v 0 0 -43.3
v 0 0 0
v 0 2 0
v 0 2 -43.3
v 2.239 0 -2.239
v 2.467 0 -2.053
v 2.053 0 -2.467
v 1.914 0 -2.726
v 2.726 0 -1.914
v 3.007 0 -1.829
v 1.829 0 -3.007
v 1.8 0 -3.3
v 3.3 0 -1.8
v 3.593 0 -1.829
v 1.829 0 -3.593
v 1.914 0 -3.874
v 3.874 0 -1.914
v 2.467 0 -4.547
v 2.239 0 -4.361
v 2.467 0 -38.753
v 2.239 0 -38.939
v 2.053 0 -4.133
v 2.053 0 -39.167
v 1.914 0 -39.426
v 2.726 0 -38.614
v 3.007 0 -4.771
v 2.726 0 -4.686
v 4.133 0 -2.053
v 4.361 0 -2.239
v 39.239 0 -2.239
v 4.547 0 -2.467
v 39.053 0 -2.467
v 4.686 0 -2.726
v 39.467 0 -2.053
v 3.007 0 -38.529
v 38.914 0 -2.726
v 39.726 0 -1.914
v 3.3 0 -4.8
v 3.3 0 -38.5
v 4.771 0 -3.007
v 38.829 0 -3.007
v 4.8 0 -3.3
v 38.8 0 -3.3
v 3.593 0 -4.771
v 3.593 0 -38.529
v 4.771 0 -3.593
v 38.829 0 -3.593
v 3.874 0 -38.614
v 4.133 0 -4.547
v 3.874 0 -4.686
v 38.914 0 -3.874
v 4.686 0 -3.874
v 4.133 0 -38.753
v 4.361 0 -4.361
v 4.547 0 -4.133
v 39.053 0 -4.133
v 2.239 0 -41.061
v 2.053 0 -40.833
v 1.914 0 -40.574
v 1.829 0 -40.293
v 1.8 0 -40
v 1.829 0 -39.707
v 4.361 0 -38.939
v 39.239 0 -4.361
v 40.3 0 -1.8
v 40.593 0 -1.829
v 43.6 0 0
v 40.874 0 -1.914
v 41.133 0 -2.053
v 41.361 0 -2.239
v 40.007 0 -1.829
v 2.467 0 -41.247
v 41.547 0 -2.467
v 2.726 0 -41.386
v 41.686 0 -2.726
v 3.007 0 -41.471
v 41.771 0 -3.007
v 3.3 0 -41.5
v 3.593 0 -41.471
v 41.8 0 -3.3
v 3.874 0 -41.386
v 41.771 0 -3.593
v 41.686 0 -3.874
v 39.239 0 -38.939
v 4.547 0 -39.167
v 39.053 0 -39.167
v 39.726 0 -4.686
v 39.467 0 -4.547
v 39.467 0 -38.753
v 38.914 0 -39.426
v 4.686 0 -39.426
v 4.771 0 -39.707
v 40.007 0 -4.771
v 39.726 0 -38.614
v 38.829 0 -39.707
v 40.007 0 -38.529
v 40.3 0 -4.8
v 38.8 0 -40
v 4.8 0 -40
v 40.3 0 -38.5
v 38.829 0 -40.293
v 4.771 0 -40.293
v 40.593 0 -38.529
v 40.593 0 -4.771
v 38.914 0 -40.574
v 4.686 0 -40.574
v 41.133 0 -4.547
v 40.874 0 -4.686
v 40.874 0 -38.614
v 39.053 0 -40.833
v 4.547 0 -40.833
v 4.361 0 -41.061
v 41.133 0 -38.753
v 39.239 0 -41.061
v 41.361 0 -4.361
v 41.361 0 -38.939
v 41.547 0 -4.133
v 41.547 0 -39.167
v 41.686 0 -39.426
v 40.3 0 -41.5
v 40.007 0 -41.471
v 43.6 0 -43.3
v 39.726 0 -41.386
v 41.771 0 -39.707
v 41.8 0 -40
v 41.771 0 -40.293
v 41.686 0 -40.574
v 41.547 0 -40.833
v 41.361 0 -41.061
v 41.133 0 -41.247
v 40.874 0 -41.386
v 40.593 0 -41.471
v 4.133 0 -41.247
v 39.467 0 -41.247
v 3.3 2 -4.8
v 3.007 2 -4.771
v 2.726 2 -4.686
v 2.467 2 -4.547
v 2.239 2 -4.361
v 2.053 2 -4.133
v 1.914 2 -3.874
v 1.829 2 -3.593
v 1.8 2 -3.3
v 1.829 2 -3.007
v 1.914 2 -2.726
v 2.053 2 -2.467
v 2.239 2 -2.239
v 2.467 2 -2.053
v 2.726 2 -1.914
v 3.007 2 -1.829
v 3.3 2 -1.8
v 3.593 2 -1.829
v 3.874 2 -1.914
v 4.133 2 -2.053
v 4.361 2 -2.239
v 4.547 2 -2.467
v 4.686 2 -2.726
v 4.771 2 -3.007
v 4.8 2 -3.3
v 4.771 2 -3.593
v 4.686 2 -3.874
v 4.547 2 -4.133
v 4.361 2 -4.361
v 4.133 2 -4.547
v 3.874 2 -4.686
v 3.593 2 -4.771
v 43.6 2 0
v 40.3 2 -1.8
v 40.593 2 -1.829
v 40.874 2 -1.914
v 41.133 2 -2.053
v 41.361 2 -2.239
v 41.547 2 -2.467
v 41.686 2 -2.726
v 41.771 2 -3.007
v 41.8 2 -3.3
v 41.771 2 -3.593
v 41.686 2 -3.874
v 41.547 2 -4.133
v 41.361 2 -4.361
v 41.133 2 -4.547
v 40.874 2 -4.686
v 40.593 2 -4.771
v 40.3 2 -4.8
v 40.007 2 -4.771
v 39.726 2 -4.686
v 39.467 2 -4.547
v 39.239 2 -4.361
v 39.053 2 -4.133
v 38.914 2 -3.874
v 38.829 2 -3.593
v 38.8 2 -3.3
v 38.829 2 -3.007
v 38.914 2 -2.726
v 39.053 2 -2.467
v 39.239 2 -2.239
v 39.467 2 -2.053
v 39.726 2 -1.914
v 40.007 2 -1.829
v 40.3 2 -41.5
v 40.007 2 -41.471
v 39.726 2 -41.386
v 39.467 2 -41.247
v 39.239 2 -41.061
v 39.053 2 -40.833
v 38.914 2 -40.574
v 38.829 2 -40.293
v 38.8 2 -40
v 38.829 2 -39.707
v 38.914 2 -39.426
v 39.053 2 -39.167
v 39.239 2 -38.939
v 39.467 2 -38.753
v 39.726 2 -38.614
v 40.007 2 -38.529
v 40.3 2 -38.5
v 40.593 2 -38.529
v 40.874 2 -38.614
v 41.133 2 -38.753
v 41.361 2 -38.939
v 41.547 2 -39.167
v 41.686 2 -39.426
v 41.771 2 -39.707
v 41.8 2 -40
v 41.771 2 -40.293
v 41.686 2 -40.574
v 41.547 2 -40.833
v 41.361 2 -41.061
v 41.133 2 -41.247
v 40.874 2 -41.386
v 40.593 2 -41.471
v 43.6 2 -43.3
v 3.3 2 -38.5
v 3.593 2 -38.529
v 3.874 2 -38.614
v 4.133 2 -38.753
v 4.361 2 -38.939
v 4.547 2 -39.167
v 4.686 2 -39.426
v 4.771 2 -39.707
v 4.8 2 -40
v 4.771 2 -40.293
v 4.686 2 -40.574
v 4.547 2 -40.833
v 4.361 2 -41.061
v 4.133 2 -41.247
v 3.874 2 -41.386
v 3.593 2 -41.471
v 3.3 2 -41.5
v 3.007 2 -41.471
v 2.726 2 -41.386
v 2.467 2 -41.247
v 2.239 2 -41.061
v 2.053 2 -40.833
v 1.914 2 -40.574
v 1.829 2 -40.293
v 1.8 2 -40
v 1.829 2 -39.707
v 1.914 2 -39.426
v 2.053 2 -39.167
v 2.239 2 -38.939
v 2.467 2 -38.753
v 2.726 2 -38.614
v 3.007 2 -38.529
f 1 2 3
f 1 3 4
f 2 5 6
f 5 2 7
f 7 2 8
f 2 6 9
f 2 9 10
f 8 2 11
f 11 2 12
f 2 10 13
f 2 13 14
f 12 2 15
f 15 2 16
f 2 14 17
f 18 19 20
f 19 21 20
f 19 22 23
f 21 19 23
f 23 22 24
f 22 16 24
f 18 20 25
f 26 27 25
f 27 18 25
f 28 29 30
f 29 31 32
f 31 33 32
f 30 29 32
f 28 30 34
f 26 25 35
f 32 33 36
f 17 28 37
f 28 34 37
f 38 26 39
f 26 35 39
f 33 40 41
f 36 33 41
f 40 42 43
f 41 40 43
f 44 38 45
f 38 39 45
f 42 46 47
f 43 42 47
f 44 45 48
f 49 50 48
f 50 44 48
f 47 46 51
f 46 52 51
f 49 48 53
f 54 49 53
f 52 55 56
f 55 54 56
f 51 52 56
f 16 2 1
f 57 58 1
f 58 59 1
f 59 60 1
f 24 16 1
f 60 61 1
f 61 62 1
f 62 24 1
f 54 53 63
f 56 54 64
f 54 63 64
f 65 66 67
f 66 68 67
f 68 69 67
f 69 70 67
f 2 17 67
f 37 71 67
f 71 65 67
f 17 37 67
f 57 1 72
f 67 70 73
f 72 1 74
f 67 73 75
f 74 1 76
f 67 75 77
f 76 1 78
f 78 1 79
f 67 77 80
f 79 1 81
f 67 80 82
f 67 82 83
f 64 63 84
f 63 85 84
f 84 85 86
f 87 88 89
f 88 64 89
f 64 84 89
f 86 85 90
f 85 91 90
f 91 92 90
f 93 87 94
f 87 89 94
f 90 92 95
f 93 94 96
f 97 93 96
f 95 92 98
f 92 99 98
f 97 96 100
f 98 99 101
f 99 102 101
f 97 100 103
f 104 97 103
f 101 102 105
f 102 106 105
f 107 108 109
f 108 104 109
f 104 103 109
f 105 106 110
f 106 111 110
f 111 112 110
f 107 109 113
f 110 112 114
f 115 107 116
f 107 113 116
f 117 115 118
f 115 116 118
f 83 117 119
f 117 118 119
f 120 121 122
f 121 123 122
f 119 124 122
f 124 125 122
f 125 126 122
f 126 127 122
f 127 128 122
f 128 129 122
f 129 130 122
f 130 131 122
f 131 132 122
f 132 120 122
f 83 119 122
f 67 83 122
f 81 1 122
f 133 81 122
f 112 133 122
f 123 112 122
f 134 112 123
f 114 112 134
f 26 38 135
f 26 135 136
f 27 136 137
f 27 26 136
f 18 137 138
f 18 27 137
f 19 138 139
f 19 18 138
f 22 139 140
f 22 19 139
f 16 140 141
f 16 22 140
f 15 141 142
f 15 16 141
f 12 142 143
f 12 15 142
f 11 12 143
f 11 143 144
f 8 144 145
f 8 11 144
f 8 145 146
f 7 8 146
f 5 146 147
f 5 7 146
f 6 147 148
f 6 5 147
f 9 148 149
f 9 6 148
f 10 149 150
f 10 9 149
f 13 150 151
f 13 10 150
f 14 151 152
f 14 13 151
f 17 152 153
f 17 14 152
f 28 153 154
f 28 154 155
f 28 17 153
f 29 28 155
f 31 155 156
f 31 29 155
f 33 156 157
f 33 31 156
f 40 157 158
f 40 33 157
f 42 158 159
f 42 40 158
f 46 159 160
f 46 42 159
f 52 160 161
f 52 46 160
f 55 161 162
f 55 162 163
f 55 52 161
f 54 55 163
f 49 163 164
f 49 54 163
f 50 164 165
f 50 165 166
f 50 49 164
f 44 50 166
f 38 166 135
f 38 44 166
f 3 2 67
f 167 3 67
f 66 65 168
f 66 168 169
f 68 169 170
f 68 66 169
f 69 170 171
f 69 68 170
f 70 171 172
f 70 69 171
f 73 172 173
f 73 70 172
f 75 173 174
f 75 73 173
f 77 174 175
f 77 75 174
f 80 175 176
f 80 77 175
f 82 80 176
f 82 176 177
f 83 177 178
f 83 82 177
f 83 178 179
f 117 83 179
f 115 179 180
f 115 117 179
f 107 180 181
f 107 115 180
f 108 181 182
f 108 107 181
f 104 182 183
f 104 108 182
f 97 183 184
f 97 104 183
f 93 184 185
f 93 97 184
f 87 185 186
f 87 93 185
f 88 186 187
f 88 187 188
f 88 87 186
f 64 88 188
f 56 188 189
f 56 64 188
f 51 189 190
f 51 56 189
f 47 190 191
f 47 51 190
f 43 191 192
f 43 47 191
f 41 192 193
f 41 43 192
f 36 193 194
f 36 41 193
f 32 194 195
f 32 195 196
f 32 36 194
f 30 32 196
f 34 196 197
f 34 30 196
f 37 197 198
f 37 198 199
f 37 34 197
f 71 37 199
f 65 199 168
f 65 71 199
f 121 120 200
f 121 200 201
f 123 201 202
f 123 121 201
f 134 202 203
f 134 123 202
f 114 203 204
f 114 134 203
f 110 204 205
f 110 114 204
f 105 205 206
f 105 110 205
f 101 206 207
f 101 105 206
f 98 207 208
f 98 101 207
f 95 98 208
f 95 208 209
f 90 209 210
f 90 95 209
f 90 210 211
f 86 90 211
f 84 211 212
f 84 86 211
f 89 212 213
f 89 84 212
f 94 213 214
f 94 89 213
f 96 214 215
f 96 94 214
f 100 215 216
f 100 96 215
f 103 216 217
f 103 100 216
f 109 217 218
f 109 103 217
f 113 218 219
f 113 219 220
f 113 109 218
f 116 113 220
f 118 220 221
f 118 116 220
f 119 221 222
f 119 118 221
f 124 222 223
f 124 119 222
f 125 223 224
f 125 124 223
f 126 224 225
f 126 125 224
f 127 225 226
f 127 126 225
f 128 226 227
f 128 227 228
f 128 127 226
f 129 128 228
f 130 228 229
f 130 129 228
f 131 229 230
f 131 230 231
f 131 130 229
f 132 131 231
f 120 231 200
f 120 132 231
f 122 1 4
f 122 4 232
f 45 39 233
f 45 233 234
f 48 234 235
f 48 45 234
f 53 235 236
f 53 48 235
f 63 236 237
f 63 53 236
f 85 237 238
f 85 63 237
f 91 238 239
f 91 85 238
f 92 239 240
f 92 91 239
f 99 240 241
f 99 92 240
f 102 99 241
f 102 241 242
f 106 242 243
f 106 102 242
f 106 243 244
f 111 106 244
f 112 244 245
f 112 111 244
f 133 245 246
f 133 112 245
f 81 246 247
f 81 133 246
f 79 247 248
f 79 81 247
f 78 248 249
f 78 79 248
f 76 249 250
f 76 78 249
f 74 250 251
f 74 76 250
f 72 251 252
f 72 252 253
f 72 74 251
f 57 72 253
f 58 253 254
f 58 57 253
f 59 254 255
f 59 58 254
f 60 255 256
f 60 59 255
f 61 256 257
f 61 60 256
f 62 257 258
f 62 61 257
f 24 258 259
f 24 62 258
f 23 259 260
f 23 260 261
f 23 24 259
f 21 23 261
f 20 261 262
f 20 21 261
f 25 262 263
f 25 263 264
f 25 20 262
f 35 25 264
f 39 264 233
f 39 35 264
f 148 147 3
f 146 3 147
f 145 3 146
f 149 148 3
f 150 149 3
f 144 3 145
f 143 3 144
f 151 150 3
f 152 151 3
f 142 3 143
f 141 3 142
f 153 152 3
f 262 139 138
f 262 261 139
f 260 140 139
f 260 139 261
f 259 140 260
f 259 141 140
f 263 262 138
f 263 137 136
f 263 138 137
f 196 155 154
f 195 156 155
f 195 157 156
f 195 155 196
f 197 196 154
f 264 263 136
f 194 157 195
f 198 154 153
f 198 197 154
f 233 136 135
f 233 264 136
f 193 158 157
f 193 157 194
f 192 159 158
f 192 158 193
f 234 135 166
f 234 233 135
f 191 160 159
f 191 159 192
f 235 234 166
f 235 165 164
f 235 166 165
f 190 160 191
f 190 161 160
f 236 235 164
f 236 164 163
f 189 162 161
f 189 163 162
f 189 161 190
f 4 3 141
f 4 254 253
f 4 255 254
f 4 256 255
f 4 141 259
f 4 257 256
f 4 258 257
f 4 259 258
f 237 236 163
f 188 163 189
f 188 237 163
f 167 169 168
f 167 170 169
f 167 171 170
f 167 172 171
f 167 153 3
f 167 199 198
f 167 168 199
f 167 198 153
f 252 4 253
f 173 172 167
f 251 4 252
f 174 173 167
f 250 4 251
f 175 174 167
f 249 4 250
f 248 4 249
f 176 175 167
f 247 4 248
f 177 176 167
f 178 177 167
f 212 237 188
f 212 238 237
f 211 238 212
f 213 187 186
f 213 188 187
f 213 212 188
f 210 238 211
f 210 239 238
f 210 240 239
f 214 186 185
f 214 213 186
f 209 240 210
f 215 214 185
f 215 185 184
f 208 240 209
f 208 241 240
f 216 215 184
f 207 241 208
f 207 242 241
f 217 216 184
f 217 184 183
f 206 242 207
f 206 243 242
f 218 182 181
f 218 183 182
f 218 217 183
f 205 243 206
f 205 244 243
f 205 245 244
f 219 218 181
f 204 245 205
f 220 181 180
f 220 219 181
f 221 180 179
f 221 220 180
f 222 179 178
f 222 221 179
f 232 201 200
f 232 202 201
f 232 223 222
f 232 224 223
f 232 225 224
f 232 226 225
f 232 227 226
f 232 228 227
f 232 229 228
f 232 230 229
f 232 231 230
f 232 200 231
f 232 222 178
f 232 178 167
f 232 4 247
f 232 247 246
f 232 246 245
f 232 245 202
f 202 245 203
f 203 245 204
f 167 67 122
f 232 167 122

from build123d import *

# Parameters (mm, degrees)
ESQUISSE1_W        = 43.6
ESQUISSE1_H        = 43.3
ESQUISSE1_R        = 1.5
BOSS_EXTRU_1_DEPTH = 2


with BuildPart() as part:
    # Esquisse1 → Boss.-Extru.1 (new body)
    with BuildSketch(Plane(origin=(0, 0, 0), x_dir=(1, 0, 0), z_dir=(0, 1, 0))):
        with Locations((21.8, 21.65)):
            Rectangle(ESQUISSE1_W, ESQUISSE1_H)
        with Locations(Location((3.3, 40, 0), (0, 0, 270))):
            Circle(ESQUISSE1_R, mode=Mode.SUBTRACT)
        with Locations(Location((40.3, 40, 0), (0, 0, 90))):
            Circle(ESQUISSE1_R, mode=Mode.SUBTRACT)
        with Locations(Location((40.3, 3.3, 0), (0, 0, 270))):
            Circle(ESQUISSE1_R, mode=Mode.SUBTRACT)
        with Locations(Location((3.3, 3.3, 0), (0, 0, 90))):
            Circle(ESQUISSE1_R, mode=Mode.SUBTRACT)
    extrude(amount=BOSS_EXTRU_1_DEPTH)


solid = part.part
